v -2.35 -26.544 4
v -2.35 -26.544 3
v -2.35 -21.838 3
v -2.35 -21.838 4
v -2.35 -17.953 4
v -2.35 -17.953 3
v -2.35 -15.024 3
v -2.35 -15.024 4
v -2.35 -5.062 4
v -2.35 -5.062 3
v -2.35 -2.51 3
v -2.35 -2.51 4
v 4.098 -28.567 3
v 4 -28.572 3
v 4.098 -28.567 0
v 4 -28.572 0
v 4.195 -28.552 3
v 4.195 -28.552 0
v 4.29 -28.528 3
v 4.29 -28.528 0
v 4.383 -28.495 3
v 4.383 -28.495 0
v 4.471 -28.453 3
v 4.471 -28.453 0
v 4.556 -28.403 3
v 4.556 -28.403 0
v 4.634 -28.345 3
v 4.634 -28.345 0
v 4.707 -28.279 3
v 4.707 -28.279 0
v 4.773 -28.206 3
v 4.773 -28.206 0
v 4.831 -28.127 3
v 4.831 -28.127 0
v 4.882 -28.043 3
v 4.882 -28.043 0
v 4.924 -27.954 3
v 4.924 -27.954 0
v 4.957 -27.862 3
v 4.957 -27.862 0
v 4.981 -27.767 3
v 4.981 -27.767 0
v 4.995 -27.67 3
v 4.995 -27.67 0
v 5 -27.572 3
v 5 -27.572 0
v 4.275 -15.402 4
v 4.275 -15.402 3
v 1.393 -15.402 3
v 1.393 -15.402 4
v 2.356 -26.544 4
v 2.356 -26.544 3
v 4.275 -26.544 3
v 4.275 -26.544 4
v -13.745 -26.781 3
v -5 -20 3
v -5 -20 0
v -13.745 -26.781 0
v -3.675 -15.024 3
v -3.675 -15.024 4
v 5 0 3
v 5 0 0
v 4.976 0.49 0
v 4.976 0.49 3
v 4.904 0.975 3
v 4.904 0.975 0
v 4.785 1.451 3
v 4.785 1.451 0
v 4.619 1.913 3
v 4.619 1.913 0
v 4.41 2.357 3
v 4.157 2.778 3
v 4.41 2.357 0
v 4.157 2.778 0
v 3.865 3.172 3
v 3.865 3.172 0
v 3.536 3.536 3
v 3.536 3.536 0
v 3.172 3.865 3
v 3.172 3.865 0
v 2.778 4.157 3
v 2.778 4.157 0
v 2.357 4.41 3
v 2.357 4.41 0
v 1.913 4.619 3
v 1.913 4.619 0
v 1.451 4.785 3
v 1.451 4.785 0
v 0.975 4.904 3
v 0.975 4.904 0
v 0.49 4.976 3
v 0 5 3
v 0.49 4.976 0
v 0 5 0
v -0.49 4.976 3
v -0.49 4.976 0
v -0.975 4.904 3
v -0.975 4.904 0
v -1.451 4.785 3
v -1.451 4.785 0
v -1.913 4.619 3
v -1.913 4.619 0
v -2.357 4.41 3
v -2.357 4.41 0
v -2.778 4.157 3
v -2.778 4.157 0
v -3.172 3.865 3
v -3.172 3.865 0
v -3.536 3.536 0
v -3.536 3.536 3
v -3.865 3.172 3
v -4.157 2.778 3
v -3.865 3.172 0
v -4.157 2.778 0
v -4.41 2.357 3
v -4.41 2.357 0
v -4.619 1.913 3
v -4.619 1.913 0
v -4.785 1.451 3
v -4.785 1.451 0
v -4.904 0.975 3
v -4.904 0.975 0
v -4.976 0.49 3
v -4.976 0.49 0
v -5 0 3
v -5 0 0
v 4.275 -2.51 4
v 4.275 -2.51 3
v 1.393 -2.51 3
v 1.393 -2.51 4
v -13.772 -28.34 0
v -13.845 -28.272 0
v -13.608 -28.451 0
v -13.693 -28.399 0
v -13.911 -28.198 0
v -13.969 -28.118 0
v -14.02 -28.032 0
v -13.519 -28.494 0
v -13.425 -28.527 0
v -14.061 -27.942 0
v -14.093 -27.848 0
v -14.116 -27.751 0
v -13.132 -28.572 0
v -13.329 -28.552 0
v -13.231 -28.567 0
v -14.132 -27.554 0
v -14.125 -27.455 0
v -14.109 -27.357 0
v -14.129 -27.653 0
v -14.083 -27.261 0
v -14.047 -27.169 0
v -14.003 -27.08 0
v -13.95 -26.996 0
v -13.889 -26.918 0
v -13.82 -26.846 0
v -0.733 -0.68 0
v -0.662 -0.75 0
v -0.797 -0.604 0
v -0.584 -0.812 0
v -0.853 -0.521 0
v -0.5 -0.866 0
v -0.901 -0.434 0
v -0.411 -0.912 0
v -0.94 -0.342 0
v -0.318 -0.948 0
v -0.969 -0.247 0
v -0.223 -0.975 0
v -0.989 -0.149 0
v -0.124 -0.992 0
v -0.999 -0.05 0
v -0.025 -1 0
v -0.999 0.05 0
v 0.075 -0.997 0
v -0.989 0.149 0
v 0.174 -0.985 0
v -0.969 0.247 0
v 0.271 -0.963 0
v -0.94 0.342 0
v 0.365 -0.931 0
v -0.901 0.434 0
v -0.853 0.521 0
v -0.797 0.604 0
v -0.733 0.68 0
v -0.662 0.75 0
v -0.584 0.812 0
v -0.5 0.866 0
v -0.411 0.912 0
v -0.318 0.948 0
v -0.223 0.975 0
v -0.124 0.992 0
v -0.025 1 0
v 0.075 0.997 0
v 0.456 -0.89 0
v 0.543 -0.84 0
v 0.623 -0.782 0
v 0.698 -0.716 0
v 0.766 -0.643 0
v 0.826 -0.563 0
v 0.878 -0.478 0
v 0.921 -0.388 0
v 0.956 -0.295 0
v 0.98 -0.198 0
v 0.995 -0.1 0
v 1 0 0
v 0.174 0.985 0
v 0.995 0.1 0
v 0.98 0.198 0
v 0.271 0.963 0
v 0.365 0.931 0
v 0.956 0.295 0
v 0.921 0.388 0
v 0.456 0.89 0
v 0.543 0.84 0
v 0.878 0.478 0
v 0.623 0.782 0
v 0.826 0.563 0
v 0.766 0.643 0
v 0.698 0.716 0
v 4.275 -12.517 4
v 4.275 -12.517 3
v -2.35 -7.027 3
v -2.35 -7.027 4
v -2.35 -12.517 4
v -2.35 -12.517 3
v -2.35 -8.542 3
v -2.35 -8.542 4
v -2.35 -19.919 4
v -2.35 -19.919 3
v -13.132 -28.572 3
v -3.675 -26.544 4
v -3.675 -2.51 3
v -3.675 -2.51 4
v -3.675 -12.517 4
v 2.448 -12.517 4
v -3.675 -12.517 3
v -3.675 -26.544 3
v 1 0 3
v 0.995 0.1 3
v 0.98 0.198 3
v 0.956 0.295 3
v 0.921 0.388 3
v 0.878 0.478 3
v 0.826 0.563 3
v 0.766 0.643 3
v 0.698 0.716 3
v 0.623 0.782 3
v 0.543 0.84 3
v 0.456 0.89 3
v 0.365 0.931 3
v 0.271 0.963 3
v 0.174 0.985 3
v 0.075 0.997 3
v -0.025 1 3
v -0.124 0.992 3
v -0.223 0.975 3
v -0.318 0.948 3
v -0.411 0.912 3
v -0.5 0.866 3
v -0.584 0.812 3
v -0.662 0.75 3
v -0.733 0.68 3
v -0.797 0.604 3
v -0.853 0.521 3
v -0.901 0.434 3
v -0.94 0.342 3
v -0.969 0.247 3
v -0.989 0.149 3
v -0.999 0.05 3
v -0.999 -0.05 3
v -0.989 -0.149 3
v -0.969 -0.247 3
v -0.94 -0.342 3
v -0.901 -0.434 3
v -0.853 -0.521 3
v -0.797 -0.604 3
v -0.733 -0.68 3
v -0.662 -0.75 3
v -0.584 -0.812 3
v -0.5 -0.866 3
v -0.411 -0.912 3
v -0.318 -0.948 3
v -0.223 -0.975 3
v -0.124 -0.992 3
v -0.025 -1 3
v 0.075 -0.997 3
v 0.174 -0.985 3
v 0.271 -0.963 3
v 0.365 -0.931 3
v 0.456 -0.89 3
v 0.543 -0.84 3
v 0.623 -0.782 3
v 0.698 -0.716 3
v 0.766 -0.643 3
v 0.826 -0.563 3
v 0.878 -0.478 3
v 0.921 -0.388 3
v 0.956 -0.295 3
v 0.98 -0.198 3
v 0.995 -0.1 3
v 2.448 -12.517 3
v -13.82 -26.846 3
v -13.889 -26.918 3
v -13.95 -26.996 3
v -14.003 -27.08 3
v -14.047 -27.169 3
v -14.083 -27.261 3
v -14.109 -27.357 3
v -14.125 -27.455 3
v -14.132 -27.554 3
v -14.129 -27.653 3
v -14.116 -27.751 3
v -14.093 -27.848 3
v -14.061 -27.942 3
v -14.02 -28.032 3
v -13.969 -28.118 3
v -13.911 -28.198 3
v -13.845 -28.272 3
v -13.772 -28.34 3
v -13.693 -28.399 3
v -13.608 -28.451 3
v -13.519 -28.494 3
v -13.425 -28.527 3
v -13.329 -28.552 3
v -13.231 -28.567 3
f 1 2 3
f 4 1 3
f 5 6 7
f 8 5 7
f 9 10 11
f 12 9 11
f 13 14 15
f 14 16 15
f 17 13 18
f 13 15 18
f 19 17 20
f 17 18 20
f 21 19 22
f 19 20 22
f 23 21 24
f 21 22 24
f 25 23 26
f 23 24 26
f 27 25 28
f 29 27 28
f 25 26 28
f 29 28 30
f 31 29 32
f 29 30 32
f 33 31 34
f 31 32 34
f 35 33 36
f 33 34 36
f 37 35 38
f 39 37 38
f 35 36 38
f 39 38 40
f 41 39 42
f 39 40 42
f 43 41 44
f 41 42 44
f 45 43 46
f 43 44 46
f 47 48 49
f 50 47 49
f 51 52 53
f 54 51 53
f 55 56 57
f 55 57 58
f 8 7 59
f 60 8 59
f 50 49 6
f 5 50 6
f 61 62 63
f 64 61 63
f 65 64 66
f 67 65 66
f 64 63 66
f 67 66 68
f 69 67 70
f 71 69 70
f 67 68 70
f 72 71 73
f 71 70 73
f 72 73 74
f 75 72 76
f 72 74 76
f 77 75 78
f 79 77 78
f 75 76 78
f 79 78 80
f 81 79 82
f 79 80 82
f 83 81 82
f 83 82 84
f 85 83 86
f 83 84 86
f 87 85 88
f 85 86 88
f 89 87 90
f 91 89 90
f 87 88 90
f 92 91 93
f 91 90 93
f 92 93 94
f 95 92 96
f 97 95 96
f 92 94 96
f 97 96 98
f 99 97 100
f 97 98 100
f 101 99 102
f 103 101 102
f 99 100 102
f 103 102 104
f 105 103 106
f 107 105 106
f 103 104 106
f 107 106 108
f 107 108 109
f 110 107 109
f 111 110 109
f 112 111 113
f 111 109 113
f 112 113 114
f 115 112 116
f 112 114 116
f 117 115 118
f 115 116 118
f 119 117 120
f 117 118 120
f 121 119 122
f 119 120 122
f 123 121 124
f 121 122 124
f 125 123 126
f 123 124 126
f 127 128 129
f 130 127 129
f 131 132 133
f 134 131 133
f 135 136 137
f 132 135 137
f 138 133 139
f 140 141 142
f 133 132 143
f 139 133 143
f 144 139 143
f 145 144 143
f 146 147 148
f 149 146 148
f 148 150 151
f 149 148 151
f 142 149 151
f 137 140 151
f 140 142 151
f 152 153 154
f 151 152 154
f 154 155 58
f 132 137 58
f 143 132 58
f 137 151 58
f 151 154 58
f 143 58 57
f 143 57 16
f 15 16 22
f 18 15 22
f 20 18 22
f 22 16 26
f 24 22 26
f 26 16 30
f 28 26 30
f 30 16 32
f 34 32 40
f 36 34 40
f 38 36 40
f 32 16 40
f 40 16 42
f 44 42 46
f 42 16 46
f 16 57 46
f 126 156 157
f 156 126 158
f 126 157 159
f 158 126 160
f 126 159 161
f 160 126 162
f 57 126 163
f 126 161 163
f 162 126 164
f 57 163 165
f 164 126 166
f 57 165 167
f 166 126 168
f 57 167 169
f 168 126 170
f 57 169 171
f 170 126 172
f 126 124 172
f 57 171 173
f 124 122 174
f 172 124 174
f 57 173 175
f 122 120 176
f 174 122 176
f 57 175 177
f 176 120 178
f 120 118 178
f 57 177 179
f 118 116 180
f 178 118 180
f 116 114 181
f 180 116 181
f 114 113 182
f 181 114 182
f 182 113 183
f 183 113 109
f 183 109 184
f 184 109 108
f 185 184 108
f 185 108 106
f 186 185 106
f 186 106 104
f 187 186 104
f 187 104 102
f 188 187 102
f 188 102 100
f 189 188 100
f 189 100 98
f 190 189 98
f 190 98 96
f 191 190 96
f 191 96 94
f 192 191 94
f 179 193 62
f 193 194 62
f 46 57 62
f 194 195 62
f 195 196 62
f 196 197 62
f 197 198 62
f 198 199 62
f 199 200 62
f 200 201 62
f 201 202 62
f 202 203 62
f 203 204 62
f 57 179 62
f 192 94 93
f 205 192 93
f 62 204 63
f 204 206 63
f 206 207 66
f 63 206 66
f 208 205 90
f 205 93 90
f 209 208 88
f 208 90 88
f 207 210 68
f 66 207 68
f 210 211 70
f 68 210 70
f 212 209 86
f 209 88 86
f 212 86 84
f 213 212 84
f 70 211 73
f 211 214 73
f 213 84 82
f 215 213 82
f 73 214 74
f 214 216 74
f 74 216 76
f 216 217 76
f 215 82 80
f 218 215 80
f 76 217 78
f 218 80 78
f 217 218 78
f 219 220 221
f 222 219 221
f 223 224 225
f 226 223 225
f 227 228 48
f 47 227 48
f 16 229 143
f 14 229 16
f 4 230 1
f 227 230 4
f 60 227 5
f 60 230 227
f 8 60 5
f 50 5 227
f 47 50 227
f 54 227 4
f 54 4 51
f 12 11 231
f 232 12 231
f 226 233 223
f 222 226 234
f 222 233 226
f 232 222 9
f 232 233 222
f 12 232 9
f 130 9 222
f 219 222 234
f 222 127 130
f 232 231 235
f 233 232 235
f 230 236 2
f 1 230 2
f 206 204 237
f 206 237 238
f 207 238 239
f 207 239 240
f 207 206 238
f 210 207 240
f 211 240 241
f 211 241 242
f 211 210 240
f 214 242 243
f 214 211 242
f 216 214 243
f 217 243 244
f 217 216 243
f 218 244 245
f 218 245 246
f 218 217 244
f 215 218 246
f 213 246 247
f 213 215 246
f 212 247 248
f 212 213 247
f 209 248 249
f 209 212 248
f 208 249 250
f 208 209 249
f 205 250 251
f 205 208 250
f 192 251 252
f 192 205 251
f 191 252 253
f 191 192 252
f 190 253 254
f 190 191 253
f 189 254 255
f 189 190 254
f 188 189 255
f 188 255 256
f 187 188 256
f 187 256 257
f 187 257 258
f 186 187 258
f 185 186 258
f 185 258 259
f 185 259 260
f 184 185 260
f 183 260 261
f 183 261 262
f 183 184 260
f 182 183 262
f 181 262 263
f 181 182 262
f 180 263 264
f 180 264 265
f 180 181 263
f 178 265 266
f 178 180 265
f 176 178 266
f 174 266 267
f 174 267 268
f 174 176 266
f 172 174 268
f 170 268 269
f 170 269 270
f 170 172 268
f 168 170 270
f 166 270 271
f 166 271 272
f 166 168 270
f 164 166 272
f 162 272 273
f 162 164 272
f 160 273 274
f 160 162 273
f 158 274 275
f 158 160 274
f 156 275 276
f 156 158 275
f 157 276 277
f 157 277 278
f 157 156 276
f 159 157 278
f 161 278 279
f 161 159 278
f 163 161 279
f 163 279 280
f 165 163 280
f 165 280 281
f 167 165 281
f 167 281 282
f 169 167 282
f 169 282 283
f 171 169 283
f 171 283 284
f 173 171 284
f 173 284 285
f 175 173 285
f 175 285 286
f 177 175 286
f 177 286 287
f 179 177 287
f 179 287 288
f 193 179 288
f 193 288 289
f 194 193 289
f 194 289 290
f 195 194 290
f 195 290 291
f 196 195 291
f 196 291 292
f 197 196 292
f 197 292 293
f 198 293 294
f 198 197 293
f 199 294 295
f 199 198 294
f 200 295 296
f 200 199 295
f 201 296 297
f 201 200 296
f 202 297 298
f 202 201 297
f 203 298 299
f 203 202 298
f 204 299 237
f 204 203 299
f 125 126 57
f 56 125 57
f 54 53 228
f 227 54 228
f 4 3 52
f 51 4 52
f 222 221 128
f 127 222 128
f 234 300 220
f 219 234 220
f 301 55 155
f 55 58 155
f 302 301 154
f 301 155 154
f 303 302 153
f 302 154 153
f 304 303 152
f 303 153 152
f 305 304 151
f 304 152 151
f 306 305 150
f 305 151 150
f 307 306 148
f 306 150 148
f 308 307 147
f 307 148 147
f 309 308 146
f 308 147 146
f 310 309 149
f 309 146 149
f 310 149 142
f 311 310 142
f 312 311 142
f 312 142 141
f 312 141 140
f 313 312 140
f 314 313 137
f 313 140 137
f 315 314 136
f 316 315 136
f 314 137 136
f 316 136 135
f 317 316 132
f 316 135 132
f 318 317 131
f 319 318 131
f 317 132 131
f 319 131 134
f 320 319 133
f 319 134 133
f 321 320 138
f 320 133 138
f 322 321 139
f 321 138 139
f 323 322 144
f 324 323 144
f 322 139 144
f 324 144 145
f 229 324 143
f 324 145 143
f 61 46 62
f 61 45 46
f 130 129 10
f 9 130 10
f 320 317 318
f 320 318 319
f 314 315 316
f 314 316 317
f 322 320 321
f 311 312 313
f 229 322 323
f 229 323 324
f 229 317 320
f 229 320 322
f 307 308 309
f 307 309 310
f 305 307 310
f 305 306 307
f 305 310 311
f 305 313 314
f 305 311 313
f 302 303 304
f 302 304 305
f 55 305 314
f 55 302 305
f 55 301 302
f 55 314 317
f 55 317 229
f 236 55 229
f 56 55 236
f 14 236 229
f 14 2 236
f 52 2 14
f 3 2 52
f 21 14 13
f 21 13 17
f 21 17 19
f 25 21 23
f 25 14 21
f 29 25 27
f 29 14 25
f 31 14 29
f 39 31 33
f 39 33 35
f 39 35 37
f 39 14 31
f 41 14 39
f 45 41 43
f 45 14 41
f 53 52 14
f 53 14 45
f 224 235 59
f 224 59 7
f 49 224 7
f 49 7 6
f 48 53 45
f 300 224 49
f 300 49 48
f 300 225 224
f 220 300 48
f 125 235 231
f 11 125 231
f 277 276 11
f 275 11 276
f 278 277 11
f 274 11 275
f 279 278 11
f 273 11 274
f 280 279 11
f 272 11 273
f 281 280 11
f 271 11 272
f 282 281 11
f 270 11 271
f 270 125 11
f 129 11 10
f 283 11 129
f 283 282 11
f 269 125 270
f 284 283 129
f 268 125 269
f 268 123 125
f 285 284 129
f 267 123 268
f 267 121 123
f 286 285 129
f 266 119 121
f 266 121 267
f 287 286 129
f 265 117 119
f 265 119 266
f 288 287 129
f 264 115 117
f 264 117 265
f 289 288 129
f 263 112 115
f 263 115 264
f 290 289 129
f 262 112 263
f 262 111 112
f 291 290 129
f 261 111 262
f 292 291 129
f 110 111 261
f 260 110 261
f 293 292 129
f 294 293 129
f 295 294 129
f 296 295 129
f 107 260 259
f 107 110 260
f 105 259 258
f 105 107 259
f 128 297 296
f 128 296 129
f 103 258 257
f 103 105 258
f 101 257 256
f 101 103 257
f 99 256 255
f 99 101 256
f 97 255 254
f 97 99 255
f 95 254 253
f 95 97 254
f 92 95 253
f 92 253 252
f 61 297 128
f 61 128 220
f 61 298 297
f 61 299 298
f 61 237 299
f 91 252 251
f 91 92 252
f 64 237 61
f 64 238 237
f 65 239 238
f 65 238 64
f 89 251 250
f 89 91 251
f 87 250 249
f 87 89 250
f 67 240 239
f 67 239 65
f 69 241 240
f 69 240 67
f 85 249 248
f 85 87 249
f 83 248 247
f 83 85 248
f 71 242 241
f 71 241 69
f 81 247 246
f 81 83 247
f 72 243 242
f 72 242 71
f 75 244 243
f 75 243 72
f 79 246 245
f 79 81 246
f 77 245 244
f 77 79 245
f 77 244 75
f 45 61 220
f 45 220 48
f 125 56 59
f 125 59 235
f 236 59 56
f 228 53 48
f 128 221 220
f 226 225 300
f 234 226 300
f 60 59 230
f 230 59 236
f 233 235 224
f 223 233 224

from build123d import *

# Parameters (mm, degrees)
SKETCH_1_R      = 1
EXTRUDE_1_DEPTH = 3
EXTRUDE_2_DEPTH = 3
FILLET_2_R      = 1
FILLET_3_R      = 1
EXTRUDE_3_DEPTH = 1


with BuildPart() as part:
    # 草图1 → 凸台-拉伸1 (new body)
    with BuildSketch(Plane.XY):
        with BuildLine():
            Line((-5, 0), (-5, -20))
            Line((-5, -20), (5, -20))
            Line((5, -20), (5, 0))
            ThreePointArc((5, 0), (0, 5), (-5, 0))
        make_face()
        Circle(SKETCH_1_R, mode=Mode.SUBTRACT)
    extrude(amount=EXTRUDE_1_DEPTH)

    # 草图2 → 凸台-拉伸2 (add)
    with BuildSketch(Plane.XY.offset(3)):
        Polygon((5, -20), (-5, -20), (-16.053330201, -28.571505672), (5, -28.571505672), align=None)
    extrude(amount=-EXTRUDE_2_DEPTH)

    # 圆角2
    fillet_2_edges = [part.edges().sort_by_distance(p)[0] for p in [
        (-16.053330201, -28.571505672, 1.5),
    ]]
    fillet(fillet_2_edges, radius=FILLET_2_R)

    # 圆角3
    fillet_3_edges = [part.edges().sort_by_distance(p)[0] for p in [
        (5, -28.571505672, 1.5),
    ]]
    fillet(fillet_3_edges, radius=FILLET_3_R)

    # 草图3 → 凸台-拉伸3 (add)
    with BuildSketch(Plane.XY.offset(3)):
        Polygon((-3.674988176, -2.510402489), (-3.674988176, -12.516814932), (-2.349938126, -12.516814932), (-2.349938126, -8.541664784), (2.447656881, -12.516814932), (4.275312121, -12.516814932), (-2.349938126, -7.02732187), (4.275312121, -2.510402489), (1.392652218, -2.510402489), (-2.349938126, -5.062001029), (-2.349938126, -2.510402489), align=None)
        Polygon((-3.674988176, -15.023538628), (-3.674988176, -26.544068904), (-2.349938126, -26.544068904), (-2.349938126, -21.837856659), (2.356274118, -26.544068904), (4.275312121, -26.544068904), (-2.349938126, -19.918818657), (4.275312121, -15.401899276), (1.392652218, -15.401899276), (-2.349938126, -17.953497816), (-2.349938126, -15.023538628), align=None)
    extrude(amount=EXTRUDE_3_DEPTH)


solid = part.part
